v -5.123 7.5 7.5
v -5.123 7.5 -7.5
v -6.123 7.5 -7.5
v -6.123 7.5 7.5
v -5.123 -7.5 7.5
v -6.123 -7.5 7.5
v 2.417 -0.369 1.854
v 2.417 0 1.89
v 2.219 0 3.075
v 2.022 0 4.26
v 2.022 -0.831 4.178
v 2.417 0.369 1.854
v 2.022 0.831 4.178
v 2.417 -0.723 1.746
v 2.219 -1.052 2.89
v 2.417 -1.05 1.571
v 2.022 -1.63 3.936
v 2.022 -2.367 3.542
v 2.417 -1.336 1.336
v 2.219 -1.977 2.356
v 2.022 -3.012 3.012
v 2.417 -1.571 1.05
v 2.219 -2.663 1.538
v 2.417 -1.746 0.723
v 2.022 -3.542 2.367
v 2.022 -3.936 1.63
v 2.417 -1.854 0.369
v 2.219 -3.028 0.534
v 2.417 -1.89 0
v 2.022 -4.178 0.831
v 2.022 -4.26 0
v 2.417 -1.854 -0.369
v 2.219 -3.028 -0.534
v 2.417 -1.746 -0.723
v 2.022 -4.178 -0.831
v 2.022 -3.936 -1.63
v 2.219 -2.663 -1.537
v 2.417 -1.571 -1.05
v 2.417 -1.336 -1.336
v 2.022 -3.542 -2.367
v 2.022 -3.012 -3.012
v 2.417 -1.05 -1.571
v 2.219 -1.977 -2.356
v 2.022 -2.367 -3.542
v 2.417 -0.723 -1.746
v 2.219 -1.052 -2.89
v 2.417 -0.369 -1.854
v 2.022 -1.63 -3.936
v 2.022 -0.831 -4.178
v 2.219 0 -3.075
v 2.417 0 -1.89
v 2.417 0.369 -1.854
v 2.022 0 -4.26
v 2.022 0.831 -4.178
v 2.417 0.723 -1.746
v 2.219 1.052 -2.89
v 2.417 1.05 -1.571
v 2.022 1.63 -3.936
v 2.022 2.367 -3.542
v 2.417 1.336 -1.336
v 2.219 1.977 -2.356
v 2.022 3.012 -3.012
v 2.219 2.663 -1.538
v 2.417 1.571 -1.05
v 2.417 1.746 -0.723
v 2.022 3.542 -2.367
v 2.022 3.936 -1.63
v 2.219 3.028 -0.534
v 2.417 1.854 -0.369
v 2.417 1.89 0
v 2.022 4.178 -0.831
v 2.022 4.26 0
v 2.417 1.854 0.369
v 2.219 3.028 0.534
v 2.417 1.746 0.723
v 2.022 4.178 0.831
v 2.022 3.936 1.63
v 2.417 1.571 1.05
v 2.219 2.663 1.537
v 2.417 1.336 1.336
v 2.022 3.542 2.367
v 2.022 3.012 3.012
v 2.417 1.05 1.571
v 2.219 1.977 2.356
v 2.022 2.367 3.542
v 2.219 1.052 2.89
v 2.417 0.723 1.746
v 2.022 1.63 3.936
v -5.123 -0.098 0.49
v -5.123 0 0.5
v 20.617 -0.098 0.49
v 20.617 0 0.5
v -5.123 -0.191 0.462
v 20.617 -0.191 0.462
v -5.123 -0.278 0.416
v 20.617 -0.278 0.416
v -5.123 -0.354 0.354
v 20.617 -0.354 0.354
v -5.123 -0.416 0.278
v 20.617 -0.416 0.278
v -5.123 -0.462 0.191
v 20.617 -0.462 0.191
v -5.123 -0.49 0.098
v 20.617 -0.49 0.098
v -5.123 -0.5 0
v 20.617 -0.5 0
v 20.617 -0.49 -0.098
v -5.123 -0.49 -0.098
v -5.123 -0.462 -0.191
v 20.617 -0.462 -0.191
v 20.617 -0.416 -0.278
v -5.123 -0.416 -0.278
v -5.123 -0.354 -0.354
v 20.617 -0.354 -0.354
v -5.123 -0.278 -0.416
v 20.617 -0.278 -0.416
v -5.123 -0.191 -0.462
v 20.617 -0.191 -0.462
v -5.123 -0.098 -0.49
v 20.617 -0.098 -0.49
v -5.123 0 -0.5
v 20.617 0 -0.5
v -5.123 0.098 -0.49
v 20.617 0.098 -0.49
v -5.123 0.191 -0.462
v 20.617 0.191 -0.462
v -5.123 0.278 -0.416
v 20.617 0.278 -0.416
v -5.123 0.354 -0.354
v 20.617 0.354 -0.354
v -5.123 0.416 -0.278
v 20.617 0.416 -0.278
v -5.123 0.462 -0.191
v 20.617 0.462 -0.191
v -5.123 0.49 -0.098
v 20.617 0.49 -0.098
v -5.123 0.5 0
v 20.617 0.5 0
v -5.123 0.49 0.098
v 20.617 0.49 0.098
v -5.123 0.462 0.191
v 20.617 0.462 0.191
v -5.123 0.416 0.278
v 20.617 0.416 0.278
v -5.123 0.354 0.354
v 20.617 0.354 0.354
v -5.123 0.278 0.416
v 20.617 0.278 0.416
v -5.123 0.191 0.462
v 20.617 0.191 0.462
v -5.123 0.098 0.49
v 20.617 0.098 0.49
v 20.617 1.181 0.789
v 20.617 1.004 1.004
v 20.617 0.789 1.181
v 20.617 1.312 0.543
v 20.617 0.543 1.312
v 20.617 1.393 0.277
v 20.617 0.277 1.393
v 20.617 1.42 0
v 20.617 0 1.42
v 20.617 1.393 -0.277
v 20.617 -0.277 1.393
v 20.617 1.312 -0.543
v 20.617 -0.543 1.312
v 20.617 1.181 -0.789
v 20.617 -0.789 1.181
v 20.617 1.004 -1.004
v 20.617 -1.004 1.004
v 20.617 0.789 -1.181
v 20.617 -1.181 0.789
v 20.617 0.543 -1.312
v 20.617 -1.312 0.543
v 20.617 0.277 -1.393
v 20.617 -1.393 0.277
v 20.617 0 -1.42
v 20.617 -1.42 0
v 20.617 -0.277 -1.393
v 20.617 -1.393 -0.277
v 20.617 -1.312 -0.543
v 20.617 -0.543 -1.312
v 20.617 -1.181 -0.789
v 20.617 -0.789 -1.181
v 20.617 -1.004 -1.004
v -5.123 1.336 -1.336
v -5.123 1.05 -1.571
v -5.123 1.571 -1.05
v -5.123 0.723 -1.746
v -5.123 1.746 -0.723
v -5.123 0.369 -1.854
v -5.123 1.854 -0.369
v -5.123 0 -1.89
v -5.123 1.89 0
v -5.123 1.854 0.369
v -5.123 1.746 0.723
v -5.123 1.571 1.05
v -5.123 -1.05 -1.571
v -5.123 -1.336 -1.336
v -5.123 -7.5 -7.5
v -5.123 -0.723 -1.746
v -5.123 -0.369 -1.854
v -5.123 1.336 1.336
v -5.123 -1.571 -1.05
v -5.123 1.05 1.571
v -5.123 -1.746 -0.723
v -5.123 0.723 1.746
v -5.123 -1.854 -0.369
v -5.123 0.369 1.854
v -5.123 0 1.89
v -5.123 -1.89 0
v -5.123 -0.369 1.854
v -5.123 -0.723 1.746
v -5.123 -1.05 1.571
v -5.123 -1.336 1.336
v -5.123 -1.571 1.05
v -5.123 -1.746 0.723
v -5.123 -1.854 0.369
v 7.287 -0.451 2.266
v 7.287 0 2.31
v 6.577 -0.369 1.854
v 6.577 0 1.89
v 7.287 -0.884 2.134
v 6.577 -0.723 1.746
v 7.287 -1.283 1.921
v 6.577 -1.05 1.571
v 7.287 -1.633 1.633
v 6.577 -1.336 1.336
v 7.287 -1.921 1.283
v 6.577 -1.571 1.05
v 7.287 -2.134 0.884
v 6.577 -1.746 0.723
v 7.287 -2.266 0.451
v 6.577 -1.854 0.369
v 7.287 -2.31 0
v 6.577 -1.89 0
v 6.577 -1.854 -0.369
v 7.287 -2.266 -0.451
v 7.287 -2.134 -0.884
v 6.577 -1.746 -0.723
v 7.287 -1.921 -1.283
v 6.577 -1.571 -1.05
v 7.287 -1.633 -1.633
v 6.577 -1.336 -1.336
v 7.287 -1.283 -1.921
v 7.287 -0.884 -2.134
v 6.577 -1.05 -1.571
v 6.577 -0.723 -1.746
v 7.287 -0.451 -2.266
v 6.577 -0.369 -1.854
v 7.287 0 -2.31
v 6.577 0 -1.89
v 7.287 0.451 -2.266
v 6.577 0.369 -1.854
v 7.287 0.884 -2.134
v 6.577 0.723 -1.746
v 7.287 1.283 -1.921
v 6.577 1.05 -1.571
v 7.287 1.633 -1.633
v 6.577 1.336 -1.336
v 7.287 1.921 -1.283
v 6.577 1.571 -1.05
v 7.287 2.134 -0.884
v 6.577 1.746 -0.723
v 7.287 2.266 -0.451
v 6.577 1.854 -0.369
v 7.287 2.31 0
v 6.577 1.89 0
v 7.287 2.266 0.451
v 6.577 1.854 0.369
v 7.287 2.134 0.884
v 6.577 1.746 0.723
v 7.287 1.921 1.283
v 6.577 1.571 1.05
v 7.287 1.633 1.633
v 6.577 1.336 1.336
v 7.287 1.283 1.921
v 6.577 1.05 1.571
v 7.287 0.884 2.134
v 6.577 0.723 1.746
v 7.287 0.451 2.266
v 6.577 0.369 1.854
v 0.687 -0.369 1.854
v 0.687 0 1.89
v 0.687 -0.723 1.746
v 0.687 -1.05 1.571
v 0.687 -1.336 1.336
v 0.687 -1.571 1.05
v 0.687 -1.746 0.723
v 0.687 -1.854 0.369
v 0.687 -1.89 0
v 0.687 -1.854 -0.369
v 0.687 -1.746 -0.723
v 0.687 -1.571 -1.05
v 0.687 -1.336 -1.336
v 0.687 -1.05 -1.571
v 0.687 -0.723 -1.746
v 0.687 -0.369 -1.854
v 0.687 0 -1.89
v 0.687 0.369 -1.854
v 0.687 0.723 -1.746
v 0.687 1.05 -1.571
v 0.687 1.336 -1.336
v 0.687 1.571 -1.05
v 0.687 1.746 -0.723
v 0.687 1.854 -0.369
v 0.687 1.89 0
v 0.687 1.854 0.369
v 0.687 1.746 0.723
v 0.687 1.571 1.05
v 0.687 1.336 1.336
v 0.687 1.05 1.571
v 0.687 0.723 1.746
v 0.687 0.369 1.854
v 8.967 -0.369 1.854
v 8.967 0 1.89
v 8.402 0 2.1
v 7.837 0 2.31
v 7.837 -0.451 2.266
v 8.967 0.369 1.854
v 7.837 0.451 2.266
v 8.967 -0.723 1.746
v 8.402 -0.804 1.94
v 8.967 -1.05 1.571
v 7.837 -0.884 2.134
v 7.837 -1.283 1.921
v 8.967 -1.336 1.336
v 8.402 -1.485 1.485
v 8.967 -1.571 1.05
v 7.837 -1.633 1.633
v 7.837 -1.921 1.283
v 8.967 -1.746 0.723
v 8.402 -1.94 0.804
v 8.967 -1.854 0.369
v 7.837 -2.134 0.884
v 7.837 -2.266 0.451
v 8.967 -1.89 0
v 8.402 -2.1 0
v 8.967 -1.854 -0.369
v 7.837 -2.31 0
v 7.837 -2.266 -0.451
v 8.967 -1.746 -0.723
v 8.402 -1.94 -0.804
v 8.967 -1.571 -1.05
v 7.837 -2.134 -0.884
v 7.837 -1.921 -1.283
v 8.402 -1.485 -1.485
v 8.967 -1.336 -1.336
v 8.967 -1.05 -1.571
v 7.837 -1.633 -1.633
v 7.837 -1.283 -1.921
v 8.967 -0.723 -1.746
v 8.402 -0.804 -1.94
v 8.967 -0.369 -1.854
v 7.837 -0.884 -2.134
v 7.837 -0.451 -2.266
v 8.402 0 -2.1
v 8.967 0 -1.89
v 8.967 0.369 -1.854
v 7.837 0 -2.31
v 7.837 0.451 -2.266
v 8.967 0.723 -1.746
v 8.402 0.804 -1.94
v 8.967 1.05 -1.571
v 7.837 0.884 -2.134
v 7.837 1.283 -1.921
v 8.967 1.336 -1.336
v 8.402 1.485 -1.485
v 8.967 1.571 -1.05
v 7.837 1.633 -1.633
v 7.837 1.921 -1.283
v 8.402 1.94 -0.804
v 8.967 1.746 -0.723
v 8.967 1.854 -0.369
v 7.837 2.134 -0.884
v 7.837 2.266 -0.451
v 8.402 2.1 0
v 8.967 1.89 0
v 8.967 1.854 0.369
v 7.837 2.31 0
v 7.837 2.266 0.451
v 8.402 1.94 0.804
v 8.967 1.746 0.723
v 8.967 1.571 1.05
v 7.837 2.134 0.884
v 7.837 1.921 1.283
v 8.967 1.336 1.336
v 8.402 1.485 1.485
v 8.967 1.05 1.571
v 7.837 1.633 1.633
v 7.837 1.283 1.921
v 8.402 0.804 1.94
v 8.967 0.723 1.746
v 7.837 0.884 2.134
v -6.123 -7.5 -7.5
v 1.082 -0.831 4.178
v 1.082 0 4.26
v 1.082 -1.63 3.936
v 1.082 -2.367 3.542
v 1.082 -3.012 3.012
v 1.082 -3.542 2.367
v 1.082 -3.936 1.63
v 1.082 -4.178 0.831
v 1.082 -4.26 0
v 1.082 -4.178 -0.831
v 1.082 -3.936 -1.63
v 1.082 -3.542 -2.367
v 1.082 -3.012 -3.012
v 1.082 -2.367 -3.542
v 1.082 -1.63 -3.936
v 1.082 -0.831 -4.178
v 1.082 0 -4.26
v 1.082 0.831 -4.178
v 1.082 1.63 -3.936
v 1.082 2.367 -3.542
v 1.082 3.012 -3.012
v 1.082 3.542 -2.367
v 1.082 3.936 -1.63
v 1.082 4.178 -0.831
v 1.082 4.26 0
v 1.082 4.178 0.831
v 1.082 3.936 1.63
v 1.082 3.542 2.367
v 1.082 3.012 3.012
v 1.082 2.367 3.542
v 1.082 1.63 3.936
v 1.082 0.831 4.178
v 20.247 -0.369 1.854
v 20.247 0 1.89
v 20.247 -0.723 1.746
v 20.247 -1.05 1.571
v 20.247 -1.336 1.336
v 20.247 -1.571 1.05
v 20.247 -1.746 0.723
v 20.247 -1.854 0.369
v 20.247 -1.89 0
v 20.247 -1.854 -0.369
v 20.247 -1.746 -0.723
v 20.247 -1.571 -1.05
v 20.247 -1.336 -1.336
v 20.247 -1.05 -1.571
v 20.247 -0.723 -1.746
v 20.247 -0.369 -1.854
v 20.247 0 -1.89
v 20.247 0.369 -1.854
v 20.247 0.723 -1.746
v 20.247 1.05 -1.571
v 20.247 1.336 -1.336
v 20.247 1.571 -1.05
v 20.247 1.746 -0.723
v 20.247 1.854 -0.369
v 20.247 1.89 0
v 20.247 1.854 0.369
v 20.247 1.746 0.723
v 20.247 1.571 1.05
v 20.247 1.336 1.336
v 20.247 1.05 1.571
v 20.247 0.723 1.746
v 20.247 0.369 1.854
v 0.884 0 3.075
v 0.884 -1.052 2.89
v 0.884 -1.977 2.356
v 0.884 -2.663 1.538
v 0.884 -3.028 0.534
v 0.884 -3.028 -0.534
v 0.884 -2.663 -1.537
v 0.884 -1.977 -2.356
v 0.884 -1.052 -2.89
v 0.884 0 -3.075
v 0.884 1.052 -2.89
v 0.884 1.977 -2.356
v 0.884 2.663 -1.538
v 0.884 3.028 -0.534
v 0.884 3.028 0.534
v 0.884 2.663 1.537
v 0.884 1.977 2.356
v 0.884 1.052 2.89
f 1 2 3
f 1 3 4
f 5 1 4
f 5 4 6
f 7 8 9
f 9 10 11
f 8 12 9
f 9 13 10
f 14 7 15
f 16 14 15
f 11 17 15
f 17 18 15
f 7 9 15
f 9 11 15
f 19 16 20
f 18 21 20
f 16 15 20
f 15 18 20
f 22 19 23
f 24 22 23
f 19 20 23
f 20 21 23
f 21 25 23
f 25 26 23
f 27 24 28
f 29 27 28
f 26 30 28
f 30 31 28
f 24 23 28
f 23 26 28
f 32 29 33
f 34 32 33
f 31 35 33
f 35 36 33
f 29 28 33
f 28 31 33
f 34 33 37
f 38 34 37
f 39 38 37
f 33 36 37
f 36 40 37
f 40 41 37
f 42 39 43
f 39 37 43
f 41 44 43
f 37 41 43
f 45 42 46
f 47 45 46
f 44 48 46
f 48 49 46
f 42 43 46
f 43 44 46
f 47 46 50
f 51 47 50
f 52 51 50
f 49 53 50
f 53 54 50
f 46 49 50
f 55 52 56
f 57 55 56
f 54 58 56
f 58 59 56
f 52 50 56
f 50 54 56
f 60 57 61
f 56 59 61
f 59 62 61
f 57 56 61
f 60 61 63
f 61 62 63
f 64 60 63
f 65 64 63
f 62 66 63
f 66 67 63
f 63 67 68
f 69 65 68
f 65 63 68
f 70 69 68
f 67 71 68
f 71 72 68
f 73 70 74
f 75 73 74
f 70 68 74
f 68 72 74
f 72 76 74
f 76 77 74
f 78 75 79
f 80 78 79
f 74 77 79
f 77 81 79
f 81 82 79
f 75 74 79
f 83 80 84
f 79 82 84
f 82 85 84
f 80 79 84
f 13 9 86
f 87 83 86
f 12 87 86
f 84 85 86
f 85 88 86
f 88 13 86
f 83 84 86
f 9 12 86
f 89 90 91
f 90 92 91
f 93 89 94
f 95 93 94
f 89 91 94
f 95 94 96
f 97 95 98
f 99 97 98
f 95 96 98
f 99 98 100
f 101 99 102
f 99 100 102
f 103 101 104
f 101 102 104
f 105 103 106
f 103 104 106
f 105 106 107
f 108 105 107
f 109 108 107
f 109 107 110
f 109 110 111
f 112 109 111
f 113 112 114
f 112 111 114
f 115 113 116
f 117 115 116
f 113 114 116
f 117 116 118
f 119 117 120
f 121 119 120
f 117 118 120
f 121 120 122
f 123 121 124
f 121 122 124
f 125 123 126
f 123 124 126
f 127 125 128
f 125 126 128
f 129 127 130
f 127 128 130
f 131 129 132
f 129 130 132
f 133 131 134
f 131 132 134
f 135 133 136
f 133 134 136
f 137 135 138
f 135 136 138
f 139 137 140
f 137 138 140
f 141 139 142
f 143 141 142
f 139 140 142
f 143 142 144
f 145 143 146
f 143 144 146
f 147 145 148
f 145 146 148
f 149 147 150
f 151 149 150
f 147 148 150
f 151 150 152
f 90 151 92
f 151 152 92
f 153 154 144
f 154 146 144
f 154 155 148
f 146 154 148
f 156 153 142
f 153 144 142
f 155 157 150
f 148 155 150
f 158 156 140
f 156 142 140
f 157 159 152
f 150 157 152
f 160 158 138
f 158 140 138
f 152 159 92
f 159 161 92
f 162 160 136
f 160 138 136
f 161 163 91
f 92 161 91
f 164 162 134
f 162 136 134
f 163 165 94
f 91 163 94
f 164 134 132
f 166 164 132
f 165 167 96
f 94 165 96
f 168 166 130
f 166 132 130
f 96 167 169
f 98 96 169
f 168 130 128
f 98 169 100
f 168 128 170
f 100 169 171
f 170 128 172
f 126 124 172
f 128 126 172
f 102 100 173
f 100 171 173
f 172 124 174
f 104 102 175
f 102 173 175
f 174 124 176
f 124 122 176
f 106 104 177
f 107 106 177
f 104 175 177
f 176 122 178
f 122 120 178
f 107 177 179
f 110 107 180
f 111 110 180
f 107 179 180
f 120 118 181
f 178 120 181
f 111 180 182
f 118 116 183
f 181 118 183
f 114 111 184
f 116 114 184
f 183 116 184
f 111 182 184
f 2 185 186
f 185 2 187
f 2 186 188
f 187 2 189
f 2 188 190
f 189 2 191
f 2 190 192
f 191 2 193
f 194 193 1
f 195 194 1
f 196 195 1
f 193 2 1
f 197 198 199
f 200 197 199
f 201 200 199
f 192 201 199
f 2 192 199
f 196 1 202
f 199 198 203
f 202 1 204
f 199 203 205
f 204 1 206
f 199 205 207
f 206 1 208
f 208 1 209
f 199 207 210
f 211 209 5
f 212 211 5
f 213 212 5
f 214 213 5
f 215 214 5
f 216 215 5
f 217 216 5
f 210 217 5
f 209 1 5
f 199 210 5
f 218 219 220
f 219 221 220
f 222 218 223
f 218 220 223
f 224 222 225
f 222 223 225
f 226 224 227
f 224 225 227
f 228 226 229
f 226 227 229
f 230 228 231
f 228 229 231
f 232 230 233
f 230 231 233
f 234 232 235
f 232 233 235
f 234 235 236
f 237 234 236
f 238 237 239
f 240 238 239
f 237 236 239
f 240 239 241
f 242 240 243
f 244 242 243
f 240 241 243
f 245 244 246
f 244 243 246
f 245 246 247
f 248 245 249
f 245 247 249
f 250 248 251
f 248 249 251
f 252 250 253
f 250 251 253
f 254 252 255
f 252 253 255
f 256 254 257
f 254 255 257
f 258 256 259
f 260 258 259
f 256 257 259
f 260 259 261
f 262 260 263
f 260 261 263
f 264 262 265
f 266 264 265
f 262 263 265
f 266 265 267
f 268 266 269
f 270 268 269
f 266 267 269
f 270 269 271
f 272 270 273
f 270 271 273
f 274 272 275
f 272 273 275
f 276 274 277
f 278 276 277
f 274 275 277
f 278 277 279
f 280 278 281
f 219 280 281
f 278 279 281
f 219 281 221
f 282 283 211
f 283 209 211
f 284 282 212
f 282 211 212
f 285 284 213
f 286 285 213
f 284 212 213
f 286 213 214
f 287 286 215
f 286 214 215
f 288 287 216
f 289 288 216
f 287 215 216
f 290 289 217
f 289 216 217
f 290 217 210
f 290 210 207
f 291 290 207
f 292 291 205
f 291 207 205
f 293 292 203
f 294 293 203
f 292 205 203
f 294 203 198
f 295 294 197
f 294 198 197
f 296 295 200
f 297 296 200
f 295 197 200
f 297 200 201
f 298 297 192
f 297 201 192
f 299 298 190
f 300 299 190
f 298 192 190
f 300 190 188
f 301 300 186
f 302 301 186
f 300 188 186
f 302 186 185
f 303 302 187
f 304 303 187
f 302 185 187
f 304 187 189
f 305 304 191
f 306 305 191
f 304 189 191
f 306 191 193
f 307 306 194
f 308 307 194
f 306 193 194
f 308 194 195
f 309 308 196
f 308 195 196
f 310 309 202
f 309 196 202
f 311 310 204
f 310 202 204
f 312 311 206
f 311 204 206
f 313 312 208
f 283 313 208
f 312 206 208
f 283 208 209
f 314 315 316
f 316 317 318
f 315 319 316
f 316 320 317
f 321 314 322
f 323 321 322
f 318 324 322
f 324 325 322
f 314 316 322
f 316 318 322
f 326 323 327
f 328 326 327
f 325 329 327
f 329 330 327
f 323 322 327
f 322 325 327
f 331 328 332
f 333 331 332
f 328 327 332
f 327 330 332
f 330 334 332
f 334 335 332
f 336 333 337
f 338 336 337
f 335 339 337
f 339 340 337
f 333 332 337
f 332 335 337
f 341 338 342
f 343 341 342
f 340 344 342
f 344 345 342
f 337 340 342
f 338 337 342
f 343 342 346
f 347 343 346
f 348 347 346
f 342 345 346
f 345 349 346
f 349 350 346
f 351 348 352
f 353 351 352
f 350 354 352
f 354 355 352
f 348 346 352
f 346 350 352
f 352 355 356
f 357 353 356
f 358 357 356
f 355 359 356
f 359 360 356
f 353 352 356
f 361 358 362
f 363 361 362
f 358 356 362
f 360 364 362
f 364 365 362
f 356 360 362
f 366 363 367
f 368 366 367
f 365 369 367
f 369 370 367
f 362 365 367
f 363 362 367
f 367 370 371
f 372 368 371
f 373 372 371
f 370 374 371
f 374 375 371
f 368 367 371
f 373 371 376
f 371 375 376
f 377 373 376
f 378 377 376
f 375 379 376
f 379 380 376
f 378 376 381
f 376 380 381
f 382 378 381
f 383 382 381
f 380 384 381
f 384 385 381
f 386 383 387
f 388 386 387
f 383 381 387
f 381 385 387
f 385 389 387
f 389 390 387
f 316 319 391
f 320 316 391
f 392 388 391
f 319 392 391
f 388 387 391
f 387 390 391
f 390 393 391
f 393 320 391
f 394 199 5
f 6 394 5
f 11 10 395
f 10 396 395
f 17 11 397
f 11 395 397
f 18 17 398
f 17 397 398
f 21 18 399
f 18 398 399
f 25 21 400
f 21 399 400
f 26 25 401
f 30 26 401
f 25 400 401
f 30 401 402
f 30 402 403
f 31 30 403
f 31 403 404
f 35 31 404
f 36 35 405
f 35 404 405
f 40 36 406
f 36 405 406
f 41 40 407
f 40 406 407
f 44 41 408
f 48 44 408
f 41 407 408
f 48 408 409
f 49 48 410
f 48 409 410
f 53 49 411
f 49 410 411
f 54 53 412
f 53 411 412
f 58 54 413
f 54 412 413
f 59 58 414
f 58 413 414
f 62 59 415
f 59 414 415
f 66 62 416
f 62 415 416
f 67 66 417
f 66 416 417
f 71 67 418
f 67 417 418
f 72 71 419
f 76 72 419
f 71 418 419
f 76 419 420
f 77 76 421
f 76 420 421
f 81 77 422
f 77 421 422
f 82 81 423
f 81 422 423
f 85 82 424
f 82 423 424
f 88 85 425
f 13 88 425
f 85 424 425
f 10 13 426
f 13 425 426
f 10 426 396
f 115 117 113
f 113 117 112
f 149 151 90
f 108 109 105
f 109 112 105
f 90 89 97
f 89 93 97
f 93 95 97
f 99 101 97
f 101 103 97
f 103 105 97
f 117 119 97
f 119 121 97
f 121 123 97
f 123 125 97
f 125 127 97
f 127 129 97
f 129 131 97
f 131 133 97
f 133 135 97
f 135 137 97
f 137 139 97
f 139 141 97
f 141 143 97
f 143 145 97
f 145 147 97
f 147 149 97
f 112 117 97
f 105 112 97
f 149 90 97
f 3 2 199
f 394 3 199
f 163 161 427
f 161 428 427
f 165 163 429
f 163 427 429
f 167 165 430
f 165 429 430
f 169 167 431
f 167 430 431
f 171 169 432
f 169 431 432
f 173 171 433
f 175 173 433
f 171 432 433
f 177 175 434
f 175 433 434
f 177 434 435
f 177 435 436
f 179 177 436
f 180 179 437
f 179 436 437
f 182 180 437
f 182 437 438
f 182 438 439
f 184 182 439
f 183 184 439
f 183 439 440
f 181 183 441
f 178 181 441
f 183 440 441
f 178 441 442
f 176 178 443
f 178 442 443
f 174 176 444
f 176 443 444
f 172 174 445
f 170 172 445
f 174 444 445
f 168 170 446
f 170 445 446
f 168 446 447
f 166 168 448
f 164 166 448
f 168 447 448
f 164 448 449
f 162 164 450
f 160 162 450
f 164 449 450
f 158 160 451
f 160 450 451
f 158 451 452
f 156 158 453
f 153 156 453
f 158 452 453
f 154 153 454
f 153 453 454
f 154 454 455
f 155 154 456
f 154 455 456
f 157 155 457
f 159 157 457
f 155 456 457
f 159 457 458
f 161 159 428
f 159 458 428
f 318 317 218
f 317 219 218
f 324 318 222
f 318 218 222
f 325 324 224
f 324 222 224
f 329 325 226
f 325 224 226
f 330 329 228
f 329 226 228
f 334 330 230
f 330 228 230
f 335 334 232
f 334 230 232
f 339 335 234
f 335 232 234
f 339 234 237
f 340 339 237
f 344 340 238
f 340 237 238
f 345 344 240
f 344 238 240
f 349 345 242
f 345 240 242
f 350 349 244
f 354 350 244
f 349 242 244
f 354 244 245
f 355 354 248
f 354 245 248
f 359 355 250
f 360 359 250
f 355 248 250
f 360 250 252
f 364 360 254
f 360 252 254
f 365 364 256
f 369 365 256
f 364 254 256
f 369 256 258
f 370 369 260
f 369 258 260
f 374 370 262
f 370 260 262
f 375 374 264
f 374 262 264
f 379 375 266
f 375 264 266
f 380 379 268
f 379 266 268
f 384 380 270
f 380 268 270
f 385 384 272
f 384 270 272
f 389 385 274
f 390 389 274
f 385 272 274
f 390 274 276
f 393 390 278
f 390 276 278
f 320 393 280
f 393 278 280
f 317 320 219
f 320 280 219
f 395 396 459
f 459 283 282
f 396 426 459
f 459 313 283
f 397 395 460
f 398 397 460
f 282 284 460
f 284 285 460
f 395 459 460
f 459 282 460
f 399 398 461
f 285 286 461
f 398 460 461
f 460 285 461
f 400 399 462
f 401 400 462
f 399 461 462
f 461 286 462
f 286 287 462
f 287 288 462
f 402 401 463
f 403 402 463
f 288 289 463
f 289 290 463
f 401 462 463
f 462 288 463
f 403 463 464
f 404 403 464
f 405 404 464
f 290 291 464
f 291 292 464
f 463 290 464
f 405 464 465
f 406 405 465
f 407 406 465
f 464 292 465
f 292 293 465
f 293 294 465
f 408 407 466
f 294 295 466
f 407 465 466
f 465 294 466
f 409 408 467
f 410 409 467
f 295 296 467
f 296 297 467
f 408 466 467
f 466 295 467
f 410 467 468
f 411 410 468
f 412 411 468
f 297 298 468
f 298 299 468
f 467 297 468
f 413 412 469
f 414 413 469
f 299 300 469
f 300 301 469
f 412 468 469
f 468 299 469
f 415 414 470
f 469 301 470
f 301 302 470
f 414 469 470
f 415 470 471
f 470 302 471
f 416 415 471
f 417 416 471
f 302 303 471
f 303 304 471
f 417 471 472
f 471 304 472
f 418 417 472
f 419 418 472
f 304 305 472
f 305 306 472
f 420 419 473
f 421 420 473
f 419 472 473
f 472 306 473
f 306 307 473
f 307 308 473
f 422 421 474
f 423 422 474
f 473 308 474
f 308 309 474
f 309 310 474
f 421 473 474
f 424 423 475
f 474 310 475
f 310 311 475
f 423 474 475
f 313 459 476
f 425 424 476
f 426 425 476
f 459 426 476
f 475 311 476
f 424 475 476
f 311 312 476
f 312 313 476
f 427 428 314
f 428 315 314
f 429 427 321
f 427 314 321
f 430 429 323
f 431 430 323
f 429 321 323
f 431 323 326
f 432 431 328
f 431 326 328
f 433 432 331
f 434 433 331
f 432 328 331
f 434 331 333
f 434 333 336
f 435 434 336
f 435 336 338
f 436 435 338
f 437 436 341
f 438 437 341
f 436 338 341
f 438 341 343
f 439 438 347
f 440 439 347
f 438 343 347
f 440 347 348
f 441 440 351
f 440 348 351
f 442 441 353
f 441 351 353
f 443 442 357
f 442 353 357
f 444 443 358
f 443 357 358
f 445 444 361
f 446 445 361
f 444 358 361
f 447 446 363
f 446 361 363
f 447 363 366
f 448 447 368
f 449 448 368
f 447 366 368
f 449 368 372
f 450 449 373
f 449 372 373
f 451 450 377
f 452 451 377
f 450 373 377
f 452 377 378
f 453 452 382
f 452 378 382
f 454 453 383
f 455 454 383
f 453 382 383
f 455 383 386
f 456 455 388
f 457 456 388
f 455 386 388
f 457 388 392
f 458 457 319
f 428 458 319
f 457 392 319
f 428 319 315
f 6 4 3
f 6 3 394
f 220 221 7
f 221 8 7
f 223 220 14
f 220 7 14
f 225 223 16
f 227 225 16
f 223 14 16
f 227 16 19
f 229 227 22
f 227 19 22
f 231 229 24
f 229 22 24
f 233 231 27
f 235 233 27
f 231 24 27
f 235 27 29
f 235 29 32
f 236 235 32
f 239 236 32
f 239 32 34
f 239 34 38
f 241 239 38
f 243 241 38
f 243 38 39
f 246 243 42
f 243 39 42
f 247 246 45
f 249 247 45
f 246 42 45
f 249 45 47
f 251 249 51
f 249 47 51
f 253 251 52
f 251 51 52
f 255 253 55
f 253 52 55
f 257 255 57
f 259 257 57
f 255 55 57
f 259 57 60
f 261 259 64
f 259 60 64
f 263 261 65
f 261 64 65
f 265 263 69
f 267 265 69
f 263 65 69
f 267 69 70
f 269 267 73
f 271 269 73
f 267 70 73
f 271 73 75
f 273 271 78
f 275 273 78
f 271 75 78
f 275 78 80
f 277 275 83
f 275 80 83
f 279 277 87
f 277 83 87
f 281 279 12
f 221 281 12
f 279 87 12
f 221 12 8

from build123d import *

# Parameters (mm, degrees)
F2_W     = 15
F2_H     = 15
F3_DEPTH = 1


with BuildPart() as f1:
    # F0 (on Front) → F1 (revolve)
    with BuildSketch(Plane.XZ):
        Polygon((-5.123077, 1.89), (-5.123077, 0.5), (20.616923, 0.5), (20.616923, 1.42), (20.246923, 1.89), (8.966923, 1.89), (7.836923, 2.31), (7.286923, 2.31), (6.576923, 1.89), (2.416923, 1.89), (2.021923, 4.26), (1.081923, 4.26), (0.686923, 1.89), (0, 1.89), align=None)
    revolve(axis=Axis((9.142162, 0, 0), (1, 0, 0)))

    # F2 (on face) → F3 (join)
    with BuildSketch(Plane(origin=(-5.123077, 0, 0), x_dir=(0, -1, 0), z_dir=(-1, 0, 0))):
        Rectangle(F2_W, F2_H)
    extrude(amount=F3_DEPTH)


solid = f1.part
